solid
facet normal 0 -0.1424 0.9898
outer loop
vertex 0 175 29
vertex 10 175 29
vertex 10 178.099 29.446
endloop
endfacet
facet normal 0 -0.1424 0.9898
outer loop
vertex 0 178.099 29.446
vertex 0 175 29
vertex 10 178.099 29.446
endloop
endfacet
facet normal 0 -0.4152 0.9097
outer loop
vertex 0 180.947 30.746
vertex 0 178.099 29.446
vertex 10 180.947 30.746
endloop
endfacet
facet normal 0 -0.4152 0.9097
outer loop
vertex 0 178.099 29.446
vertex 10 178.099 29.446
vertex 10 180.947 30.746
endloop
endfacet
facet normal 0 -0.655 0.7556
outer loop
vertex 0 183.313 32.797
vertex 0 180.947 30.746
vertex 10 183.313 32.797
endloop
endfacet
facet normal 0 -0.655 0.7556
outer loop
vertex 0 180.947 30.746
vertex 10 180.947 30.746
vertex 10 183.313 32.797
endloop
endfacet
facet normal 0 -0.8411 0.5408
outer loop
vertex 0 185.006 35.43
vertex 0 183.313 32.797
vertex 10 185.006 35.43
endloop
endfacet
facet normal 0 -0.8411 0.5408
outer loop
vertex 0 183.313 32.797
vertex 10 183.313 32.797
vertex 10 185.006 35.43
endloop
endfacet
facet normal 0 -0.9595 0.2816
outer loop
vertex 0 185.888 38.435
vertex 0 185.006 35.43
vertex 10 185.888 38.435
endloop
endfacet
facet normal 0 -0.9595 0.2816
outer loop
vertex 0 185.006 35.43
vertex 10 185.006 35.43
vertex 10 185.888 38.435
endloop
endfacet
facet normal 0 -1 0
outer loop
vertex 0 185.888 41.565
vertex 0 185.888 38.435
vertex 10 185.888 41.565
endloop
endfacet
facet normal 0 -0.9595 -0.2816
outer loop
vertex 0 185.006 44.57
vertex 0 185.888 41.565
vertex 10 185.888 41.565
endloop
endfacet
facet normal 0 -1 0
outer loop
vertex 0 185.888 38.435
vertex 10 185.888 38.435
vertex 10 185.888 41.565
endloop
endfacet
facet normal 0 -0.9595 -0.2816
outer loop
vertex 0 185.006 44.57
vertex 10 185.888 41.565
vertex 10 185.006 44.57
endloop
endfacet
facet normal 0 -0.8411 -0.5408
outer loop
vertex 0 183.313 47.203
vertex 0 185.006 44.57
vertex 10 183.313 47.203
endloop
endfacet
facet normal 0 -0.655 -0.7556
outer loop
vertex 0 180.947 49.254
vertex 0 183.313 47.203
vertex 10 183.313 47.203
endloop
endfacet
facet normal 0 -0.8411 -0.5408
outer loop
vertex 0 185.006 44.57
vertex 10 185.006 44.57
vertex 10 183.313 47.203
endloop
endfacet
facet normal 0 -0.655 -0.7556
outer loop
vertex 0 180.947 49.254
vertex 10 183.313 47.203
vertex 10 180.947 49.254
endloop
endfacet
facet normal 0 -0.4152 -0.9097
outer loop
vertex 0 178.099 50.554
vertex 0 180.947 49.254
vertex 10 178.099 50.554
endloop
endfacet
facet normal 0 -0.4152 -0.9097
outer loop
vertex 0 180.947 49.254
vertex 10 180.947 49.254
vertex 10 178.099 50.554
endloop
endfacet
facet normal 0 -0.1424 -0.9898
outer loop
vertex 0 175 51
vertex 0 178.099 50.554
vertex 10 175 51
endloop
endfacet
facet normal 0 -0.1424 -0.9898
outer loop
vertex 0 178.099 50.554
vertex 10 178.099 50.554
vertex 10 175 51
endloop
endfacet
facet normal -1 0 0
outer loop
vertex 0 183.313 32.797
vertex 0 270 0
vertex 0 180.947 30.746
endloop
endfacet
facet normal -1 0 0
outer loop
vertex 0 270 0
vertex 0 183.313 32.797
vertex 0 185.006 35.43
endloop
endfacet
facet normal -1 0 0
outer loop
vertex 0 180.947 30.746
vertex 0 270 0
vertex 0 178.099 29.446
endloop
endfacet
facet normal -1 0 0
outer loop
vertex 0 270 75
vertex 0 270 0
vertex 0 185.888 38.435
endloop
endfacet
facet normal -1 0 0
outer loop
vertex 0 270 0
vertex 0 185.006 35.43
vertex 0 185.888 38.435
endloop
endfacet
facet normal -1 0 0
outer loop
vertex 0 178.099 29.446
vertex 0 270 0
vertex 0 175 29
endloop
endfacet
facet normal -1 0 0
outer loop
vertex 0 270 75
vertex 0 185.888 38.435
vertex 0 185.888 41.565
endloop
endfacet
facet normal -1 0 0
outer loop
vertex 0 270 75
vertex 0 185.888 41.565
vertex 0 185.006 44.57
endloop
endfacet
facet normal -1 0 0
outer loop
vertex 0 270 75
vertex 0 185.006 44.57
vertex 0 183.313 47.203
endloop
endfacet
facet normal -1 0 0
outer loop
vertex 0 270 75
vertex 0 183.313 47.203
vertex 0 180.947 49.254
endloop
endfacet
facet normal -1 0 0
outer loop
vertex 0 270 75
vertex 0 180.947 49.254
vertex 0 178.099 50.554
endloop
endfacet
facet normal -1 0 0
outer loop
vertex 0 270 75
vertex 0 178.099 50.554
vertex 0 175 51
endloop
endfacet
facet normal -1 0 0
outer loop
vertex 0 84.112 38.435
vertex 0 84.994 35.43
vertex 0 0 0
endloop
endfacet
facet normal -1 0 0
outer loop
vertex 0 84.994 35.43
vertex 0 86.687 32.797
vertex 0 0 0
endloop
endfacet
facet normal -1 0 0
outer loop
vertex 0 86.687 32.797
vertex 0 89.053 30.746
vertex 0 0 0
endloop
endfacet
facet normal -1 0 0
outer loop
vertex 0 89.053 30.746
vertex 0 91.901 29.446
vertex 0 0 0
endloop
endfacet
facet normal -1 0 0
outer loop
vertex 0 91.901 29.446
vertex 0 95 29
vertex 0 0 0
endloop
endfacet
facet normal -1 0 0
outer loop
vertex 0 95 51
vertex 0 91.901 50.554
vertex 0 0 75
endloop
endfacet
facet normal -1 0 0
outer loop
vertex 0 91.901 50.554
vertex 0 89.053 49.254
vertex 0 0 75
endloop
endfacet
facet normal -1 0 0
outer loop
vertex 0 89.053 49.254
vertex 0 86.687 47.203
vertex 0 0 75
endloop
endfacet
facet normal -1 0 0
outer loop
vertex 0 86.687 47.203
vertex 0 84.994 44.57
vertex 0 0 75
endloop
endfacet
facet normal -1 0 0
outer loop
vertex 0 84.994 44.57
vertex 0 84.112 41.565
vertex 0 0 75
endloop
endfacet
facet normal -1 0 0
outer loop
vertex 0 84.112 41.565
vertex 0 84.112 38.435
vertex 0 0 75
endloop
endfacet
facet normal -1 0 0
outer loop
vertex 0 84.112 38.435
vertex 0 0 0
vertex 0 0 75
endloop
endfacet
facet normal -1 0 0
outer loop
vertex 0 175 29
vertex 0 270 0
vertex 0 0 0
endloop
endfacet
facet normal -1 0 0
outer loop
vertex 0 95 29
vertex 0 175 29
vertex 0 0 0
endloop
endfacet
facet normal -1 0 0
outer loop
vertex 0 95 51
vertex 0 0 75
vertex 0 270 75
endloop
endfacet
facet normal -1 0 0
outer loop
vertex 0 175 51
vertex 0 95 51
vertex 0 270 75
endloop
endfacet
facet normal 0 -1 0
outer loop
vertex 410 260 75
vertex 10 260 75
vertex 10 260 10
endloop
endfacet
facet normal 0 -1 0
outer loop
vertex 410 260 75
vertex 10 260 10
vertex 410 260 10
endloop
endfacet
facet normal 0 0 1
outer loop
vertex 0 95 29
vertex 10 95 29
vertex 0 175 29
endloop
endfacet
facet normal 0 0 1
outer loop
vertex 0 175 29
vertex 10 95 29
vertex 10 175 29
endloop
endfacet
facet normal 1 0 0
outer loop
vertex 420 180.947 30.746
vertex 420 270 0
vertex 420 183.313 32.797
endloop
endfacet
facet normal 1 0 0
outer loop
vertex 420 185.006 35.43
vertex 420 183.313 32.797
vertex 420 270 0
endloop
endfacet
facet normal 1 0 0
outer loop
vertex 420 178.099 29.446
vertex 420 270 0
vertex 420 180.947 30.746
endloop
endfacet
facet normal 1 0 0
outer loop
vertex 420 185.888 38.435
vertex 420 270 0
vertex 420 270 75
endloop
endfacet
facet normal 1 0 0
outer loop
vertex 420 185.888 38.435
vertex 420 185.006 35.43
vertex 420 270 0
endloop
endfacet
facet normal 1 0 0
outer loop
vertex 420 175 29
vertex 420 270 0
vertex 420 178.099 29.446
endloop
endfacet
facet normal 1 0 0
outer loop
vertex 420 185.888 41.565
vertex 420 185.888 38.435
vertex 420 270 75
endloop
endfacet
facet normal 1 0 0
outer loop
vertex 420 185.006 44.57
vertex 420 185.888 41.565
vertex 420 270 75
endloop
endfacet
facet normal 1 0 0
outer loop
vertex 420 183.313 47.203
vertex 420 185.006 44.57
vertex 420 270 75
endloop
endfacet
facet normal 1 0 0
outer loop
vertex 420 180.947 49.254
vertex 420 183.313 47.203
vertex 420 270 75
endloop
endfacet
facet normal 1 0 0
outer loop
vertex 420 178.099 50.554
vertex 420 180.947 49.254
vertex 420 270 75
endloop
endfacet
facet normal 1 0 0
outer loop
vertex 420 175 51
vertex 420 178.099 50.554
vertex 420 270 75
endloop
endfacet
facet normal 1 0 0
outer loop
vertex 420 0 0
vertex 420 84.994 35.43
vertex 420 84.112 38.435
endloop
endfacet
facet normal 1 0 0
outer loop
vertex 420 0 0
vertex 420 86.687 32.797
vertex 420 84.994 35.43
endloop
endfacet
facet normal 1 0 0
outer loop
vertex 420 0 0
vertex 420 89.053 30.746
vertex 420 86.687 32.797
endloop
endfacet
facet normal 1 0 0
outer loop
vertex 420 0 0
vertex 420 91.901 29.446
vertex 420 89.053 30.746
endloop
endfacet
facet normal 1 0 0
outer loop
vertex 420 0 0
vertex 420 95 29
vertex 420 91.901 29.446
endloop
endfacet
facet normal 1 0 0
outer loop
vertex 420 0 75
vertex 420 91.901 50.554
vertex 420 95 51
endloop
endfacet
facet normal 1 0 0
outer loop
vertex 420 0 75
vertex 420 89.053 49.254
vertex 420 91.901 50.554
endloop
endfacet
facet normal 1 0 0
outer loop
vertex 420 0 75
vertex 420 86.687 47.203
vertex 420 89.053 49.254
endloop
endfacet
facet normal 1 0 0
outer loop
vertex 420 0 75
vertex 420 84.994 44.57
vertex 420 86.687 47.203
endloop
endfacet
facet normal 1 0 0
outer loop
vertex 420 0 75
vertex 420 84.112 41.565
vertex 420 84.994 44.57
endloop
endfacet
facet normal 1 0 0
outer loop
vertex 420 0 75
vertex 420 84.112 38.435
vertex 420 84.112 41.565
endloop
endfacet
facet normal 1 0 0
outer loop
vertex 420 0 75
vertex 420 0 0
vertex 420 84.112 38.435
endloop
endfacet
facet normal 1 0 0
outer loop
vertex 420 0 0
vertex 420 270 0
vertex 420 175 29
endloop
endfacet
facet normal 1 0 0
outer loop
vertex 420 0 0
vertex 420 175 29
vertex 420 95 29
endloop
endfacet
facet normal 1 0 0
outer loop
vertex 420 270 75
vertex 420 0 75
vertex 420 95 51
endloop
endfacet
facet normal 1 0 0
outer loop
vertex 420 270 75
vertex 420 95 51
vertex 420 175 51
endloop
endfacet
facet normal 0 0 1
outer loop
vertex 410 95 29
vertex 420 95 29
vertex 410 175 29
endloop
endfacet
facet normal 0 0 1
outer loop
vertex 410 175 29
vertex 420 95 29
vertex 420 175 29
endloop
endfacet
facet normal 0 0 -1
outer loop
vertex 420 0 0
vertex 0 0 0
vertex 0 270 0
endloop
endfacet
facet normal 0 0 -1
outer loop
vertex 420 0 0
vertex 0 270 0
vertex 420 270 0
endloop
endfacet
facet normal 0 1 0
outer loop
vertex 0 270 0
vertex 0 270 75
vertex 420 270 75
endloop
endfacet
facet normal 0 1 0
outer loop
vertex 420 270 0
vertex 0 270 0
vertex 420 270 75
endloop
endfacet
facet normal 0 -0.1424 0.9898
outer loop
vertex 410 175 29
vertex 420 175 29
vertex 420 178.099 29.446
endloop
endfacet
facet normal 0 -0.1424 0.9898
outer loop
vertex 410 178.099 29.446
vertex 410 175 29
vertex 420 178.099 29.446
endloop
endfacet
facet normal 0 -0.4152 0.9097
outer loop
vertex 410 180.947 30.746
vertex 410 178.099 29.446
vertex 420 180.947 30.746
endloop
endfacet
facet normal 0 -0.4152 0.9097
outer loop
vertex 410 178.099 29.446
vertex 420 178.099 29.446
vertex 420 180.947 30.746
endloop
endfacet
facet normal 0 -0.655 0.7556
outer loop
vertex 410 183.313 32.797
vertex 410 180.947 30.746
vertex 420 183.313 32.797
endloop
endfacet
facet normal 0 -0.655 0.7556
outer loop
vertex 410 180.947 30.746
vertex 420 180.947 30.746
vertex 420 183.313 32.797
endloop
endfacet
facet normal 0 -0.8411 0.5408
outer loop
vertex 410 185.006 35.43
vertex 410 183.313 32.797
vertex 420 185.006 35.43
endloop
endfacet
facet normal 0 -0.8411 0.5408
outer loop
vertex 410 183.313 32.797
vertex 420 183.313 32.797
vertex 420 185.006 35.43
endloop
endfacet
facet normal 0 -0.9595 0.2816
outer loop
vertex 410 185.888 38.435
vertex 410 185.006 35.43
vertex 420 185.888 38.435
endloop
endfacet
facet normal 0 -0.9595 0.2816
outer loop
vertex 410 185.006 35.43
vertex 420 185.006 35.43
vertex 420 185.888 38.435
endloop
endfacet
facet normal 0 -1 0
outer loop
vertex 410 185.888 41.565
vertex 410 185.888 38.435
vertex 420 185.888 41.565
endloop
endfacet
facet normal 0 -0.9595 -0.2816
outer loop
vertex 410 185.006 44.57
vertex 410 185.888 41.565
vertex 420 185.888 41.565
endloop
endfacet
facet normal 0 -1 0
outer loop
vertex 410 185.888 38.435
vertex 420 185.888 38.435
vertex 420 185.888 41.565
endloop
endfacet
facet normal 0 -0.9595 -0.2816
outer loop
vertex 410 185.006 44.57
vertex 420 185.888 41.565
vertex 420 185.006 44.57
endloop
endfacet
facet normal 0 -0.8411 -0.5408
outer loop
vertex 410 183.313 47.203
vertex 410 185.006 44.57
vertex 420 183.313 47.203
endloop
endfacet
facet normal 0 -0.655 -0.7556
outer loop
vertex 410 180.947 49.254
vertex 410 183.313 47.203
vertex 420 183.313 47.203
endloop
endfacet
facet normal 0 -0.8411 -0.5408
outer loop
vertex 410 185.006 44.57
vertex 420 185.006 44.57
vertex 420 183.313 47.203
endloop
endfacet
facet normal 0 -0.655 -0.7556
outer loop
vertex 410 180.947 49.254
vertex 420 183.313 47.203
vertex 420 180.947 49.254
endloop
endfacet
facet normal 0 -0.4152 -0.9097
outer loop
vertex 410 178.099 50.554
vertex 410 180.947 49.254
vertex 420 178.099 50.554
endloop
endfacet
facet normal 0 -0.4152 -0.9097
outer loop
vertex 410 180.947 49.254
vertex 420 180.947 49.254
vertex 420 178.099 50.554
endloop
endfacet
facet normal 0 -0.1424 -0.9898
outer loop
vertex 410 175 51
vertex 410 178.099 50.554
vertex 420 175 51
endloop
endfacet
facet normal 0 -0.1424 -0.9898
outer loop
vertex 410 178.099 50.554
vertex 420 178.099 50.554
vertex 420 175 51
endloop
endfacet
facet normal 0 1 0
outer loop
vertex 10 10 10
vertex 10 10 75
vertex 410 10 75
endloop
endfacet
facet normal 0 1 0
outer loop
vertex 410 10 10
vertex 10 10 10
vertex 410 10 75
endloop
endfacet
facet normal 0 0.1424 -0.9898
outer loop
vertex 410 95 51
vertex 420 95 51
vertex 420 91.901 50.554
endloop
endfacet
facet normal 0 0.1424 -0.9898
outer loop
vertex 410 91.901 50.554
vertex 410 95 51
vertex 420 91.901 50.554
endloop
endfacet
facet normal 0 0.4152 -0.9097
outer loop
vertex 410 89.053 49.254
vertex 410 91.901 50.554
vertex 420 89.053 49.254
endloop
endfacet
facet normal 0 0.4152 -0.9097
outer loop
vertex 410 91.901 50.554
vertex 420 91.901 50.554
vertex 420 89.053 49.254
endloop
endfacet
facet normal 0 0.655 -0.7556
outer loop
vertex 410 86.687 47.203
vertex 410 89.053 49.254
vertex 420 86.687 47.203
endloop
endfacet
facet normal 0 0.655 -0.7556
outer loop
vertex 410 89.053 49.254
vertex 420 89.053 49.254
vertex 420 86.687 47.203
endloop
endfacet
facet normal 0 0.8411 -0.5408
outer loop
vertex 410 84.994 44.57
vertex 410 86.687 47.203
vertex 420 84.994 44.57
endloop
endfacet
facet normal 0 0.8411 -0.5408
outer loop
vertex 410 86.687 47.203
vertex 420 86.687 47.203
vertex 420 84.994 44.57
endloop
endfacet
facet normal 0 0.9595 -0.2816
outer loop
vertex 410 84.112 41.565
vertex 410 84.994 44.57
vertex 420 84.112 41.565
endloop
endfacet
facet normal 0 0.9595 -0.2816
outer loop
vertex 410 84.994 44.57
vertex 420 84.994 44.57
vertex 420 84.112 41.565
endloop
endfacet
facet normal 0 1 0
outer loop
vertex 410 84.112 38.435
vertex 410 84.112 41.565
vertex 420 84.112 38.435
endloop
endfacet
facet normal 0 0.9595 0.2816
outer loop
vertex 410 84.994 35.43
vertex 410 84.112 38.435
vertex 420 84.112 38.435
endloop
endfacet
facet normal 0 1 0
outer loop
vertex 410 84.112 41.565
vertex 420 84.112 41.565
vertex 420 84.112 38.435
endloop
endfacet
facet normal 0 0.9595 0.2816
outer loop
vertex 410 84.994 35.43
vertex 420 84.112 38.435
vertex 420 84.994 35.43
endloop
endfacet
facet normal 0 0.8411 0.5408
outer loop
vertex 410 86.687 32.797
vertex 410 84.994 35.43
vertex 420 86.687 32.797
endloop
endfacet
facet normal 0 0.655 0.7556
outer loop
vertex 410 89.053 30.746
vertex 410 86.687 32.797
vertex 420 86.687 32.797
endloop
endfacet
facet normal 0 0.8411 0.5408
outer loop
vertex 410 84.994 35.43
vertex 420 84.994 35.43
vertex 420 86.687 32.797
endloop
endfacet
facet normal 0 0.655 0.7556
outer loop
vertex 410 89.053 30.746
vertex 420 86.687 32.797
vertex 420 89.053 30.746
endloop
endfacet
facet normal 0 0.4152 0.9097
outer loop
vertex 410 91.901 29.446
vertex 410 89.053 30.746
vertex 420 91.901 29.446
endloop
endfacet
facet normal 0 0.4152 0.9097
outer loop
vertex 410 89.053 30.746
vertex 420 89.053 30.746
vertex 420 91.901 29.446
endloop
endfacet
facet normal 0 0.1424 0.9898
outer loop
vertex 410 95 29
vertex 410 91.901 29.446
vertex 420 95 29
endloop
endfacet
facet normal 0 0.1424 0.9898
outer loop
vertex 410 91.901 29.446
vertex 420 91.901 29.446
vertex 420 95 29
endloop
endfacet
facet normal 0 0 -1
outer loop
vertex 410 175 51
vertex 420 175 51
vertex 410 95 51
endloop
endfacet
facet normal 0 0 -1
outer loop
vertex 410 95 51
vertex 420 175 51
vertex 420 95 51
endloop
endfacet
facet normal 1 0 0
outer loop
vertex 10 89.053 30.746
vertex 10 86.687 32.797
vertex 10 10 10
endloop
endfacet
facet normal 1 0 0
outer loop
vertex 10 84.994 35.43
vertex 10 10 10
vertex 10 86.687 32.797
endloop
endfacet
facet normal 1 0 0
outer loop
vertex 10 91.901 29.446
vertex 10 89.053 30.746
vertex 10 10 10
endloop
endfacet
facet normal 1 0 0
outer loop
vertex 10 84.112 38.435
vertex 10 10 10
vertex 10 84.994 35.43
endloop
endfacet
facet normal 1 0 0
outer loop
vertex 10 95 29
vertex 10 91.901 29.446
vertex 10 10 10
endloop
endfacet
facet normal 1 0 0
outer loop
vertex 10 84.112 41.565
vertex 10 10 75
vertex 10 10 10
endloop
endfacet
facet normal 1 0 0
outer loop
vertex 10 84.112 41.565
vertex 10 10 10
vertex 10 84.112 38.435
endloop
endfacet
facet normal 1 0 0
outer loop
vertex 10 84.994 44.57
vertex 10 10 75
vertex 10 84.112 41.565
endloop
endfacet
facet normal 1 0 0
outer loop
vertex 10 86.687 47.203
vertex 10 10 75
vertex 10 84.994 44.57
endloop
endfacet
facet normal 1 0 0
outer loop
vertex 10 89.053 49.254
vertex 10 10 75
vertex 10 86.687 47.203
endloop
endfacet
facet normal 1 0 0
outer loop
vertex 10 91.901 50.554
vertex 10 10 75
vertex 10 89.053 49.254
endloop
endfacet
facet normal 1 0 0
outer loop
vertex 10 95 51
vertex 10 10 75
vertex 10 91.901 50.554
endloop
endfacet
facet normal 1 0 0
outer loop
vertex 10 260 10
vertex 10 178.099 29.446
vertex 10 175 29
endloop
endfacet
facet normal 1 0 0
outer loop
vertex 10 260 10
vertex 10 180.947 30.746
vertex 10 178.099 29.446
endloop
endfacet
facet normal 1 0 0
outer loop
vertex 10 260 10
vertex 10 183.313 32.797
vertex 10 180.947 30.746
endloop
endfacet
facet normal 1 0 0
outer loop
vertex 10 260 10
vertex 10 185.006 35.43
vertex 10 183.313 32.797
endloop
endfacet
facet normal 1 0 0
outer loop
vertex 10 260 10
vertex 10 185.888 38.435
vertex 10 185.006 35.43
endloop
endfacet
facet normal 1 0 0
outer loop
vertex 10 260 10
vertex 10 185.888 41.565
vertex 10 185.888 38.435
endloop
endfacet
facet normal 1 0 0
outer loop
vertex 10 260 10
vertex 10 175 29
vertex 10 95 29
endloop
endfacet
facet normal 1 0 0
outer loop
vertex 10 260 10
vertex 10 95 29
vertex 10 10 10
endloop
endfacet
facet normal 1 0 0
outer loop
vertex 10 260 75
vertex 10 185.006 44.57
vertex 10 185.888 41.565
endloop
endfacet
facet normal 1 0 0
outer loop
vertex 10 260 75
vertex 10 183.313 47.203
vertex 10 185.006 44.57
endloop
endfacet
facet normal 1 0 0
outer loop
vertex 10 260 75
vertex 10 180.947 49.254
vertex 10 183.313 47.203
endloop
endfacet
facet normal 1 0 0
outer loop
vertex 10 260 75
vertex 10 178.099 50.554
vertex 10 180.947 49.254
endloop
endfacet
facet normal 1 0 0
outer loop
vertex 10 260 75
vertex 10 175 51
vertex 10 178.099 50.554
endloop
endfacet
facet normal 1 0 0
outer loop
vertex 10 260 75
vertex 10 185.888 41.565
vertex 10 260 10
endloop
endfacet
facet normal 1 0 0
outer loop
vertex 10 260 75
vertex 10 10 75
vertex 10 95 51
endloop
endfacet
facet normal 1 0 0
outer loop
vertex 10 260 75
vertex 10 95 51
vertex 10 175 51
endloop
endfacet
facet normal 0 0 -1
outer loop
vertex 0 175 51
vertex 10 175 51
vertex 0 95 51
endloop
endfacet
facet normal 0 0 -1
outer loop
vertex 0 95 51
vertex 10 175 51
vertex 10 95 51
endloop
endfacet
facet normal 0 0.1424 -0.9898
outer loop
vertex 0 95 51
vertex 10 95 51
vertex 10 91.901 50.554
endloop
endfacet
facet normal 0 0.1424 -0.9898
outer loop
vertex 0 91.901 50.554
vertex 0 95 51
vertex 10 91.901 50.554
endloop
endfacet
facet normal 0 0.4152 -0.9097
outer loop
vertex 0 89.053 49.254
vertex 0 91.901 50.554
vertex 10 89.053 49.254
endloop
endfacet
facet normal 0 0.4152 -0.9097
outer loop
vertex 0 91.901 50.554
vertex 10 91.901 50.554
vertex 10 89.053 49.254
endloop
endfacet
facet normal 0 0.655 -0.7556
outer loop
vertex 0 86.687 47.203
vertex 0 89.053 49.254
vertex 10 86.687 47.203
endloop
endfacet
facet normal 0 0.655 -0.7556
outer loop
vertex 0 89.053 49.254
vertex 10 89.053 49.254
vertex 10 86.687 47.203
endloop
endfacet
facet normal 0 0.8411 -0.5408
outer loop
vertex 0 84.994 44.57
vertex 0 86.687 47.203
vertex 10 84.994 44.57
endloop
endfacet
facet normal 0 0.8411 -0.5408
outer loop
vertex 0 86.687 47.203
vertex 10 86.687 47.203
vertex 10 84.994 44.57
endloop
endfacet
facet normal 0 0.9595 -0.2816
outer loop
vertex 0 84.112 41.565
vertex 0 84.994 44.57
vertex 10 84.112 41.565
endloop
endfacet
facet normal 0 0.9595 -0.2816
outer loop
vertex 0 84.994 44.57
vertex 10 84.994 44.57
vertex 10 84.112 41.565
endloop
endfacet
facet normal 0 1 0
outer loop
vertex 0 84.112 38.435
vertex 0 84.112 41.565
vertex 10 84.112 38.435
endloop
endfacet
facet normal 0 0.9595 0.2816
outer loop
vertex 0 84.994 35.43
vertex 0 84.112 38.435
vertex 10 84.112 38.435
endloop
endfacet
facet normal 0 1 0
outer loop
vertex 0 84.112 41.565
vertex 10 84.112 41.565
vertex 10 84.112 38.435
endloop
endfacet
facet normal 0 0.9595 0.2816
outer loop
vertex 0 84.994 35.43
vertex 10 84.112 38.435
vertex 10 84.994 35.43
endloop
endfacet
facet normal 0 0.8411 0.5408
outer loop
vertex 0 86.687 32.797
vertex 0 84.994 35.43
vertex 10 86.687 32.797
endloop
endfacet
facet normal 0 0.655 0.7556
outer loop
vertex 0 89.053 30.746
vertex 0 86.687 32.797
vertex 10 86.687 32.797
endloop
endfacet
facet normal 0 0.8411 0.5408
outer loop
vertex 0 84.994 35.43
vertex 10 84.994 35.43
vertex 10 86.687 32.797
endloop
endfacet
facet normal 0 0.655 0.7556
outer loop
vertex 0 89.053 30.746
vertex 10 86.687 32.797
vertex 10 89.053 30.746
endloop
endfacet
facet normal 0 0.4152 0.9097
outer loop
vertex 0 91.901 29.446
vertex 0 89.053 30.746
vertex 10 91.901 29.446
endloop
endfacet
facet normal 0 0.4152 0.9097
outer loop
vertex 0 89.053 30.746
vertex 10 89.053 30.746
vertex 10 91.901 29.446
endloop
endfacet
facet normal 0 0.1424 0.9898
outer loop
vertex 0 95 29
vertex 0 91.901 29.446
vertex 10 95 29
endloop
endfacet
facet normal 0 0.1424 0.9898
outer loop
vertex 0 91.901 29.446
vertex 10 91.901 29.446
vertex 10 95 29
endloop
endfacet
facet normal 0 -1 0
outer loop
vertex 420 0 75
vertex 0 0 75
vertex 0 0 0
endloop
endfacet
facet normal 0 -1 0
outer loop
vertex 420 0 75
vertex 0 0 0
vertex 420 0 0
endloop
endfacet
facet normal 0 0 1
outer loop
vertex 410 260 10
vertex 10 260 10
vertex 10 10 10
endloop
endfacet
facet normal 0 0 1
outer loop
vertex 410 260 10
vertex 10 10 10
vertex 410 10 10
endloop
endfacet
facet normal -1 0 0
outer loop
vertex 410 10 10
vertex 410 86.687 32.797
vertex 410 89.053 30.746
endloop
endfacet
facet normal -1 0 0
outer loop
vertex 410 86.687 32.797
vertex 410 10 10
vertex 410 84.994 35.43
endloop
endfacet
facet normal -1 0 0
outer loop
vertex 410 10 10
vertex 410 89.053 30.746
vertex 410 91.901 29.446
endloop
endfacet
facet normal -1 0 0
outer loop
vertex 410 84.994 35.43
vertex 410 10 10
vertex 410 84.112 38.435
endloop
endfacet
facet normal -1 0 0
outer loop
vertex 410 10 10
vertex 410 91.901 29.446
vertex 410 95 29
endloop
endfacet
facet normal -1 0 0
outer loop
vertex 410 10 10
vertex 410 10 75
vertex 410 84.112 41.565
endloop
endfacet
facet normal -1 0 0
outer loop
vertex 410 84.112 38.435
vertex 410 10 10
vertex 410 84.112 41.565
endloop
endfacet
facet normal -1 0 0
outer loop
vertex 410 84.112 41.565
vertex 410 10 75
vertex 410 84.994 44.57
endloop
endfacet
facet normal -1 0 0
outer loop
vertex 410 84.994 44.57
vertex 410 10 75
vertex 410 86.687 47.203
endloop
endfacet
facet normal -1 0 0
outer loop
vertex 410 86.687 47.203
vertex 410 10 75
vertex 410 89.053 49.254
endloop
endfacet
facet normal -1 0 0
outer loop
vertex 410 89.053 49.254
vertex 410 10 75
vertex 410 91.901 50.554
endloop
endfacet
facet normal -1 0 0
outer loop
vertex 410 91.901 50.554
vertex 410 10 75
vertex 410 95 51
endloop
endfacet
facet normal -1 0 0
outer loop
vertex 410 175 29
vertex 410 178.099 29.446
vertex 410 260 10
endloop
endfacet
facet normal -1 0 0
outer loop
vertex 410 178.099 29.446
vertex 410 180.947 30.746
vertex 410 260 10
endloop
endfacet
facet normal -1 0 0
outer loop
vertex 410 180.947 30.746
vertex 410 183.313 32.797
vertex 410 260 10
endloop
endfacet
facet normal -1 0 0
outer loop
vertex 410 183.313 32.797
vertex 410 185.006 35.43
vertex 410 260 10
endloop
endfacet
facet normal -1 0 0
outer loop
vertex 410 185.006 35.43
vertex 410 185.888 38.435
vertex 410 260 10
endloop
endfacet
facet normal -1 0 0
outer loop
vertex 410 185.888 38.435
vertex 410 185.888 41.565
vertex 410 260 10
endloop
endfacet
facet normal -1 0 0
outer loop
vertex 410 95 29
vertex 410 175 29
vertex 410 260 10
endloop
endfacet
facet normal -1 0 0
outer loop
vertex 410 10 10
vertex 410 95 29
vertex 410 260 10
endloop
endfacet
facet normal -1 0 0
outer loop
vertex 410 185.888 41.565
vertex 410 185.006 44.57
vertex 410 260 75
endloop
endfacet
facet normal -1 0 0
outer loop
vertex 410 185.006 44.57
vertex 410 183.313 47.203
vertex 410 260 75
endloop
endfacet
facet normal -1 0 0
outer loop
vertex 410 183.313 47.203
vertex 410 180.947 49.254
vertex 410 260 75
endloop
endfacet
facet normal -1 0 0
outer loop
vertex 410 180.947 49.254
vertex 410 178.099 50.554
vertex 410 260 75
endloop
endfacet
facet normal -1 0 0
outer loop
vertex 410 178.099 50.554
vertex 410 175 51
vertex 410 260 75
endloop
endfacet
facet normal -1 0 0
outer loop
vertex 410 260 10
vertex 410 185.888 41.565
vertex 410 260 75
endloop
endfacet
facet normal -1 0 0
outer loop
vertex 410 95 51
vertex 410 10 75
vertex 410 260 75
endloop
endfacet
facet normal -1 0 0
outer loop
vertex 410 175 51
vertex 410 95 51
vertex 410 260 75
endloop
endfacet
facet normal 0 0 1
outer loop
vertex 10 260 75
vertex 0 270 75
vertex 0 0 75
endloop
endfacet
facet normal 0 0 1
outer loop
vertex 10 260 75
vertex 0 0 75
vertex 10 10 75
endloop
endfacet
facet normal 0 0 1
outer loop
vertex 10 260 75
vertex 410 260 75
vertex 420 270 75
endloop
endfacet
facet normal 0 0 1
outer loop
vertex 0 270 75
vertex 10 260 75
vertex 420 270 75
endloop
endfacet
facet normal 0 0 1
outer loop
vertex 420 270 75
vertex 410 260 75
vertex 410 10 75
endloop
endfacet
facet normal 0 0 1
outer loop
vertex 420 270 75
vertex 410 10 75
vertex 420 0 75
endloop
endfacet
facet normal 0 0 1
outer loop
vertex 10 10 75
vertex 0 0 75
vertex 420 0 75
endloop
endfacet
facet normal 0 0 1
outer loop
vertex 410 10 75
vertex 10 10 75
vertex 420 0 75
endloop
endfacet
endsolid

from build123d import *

# Parameters (mm, degrees)
F0_W     = 420
F0_H     = 75
F1_DEPTH = 270
F2_W     = 400
F2_H     = 250
F3_DEPTH = 65
F5_DEPTH = 420.001


with BuildPart() as f1:
    # F0 (on Front) → F1 (new body)
    with BuildSketch(Plane.XZ):
        with Locations((210, 37.5)):
            Rectangle(F0_W, F0_H)
    extrude(amount=-F1_DEPTH)

    # F2 (on face) → F3 (cut)
    with BuildSketch(Plane.XY.offset(75)):
        with Locations((210, 135)):
            Rectangle(F2_W, F2_H)
    extrude(amount=-F3_DEPTH, mode=Mode.SUBTRACT)

    # F4 (on face) → F5 (cut, through all)
    with BuildSketch(Plane.YZ.offset(420)):
        with BuildLine():
            Line((175, 51), (95, 51))
            ThreePointArc((95, 51), (84, 40), (95, 29))
            Line((95, 29), (175, 29))
            ThreePointArc((175, 29), (186, 40), (175, 51))
        make_face()
    extrude(amount=-F5_DEPTH, mode=Mode.SUBTRACT)


solid = f1.part
